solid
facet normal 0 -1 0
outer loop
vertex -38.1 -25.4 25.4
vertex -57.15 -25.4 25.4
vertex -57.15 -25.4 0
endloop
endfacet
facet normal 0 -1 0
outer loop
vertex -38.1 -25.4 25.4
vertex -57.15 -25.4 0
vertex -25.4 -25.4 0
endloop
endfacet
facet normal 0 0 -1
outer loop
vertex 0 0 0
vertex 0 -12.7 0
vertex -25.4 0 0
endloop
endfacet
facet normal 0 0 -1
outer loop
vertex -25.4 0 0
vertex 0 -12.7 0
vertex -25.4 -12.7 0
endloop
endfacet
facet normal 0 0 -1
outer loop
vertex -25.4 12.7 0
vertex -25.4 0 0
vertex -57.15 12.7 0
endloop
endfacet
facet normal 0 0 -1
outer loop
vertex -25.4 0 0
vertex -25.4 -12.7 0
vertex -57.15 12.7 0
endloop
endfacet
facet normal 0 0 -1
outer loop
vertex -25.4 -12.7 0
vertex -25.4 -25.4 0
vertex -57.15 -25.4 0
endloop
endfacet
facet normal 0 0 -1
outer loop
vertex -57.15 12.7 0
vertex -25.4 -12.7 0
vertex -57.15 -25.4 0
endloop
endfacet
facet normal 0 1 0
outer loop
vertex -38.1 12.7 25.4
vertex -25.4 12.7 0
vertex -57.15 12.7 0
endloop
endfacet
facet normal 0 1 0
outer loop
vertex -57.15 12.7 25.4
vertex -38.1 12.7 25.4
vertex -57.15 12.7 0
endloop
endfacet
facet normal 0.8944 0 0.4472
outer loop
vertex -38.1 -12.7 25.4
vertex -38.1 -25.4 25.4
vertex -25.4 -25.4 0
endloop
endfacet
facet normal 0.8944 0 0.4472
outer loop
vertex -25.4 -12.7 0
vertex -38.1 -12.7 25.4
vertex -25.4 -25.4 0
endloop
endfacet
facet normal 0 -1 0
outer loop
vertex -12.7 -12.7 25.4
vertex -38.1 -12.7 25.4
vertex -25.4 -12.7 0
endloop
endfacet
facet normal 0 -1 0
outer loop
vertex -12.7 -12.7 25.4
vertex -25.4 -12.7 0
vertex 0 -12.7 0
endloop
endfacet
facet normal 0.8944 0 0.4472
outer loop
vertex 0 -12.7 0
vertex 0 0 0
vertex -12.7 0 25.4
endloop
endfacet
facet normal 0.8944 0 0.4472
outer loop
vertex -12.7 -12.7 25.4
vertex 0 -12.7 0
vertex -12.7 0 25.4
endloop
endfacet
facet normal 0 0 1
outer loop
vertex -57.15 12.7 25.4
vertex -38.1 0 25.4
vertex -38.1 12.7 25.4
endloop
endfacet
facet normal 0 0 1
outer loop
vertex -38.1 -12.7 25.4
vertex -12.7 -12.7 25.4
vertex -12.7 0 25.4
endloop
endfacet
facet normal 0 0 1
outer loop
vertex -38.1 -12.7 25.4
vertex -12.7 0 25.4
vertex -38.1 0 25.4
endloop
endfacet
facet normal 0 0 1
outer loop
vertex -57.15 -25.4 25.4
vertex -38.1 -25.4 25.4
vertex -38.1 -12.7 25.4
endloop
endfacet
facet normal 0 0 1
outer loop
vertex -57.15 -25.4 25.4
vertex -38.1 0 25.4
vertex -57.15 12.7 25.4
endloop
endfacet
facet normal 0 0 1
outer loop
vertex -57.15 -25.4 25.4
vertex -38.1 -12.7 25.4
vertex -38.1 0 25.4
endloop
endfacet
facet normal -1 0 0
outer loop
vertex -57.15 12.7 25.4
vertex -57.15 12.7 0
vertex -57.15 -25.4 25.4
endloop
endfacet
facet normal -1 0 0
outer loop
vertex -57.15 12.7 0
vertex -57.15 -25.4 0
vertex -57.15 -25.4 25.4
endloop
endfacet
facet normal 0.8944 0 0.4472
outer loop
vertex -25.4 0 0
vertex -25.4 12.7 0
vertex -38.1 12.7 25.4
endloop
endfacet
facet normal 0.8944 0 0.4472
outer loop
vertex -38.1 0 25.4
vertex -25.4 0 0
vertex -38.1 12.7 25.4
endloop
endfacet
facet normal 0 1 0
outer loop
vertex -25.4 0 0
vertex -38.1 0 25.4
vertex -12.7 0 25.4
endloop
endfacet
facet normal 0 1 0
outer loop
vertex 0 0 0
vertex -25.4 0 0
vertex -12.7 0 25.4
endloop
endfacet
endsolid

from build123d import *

# Parameters (mm, degrees)
F0_W      = 57.15
F0_H      = 25.4
F1_DEPTH  = 12.7
F2_W      = 31.75
F2_H      = 25.4
F3_DEPTH  = 12.7
F4_W      = 31.75
F4_H      = 25.4
F5_DEPTH  = 12.7
F7_DEPTH  = 12.7
F9_DEPTH  = 12.7
F11_DEPTH = 12.7


with BuildPart() as f1:
    # F0 (on Front) → F1 (new body)
    with BuildSketch(Plane.XZ):
        with Locations((-28.575, 12.7)):
            Rectangle(F0_W, F0_H)
    extrude(amount=F1_DEPTH)

    # F2 (on face) → F3 (join)
    with BuildSketch(Plane.XZ.offset(12.7)):
        with Locations((-41.275, 12.7)):
            Rectangle(F2_W, F2_H)
    extrude(amount=F3_DEPTH)

    # F4 (on face) → F5 (join)
    with BuildSketch(Plane(origin=(0, 0, 0), x_dir=(-1, 0, 0), z_dir=(0, 1, 0))):
        with Locations((41.275, 12.7)):
            Rectangle(F4_W, F4_H)
    extrude(amount=F5_DEPTH)

    # F6 (on face) → F7 (cut)
    with BuildSketch(Plane(origin=(0, 12.7, 0), x_dir=(-1, 0, 0), z_dir=(0, 1, 0))):
        Polygon((25.4, 25.4), (25.4, 0), (38.1, 25.4), align=None)
    extrude(amount=-F7_DEPTH, mode=Mode.SUBTRACT)

    # F8 (on face) → F9 (cut)
    with BuildSketch(Plane(origin=(0, 0, 0), x_dir=(-1, 0, 0), z_dir=(0, 1, 0))):
        Polygon((0, 25.4), (0, 0), (12.7, 25.4), align=None)
    extrude(amount=-F9_DEPTH, mode=Mode.SUBTRACT)

    # F10 (on face) → F11 (cut)
    with BuildSketch(Plane.XZ.offset(25.4)):
        Polygon((-38.1, 25.4), (-25.4, 0), (-25.4, 25.4), align=None)
    extrude(amount=-F11_DEPTH, mode=Mode.SUBTRACT)


solid = f1.part
